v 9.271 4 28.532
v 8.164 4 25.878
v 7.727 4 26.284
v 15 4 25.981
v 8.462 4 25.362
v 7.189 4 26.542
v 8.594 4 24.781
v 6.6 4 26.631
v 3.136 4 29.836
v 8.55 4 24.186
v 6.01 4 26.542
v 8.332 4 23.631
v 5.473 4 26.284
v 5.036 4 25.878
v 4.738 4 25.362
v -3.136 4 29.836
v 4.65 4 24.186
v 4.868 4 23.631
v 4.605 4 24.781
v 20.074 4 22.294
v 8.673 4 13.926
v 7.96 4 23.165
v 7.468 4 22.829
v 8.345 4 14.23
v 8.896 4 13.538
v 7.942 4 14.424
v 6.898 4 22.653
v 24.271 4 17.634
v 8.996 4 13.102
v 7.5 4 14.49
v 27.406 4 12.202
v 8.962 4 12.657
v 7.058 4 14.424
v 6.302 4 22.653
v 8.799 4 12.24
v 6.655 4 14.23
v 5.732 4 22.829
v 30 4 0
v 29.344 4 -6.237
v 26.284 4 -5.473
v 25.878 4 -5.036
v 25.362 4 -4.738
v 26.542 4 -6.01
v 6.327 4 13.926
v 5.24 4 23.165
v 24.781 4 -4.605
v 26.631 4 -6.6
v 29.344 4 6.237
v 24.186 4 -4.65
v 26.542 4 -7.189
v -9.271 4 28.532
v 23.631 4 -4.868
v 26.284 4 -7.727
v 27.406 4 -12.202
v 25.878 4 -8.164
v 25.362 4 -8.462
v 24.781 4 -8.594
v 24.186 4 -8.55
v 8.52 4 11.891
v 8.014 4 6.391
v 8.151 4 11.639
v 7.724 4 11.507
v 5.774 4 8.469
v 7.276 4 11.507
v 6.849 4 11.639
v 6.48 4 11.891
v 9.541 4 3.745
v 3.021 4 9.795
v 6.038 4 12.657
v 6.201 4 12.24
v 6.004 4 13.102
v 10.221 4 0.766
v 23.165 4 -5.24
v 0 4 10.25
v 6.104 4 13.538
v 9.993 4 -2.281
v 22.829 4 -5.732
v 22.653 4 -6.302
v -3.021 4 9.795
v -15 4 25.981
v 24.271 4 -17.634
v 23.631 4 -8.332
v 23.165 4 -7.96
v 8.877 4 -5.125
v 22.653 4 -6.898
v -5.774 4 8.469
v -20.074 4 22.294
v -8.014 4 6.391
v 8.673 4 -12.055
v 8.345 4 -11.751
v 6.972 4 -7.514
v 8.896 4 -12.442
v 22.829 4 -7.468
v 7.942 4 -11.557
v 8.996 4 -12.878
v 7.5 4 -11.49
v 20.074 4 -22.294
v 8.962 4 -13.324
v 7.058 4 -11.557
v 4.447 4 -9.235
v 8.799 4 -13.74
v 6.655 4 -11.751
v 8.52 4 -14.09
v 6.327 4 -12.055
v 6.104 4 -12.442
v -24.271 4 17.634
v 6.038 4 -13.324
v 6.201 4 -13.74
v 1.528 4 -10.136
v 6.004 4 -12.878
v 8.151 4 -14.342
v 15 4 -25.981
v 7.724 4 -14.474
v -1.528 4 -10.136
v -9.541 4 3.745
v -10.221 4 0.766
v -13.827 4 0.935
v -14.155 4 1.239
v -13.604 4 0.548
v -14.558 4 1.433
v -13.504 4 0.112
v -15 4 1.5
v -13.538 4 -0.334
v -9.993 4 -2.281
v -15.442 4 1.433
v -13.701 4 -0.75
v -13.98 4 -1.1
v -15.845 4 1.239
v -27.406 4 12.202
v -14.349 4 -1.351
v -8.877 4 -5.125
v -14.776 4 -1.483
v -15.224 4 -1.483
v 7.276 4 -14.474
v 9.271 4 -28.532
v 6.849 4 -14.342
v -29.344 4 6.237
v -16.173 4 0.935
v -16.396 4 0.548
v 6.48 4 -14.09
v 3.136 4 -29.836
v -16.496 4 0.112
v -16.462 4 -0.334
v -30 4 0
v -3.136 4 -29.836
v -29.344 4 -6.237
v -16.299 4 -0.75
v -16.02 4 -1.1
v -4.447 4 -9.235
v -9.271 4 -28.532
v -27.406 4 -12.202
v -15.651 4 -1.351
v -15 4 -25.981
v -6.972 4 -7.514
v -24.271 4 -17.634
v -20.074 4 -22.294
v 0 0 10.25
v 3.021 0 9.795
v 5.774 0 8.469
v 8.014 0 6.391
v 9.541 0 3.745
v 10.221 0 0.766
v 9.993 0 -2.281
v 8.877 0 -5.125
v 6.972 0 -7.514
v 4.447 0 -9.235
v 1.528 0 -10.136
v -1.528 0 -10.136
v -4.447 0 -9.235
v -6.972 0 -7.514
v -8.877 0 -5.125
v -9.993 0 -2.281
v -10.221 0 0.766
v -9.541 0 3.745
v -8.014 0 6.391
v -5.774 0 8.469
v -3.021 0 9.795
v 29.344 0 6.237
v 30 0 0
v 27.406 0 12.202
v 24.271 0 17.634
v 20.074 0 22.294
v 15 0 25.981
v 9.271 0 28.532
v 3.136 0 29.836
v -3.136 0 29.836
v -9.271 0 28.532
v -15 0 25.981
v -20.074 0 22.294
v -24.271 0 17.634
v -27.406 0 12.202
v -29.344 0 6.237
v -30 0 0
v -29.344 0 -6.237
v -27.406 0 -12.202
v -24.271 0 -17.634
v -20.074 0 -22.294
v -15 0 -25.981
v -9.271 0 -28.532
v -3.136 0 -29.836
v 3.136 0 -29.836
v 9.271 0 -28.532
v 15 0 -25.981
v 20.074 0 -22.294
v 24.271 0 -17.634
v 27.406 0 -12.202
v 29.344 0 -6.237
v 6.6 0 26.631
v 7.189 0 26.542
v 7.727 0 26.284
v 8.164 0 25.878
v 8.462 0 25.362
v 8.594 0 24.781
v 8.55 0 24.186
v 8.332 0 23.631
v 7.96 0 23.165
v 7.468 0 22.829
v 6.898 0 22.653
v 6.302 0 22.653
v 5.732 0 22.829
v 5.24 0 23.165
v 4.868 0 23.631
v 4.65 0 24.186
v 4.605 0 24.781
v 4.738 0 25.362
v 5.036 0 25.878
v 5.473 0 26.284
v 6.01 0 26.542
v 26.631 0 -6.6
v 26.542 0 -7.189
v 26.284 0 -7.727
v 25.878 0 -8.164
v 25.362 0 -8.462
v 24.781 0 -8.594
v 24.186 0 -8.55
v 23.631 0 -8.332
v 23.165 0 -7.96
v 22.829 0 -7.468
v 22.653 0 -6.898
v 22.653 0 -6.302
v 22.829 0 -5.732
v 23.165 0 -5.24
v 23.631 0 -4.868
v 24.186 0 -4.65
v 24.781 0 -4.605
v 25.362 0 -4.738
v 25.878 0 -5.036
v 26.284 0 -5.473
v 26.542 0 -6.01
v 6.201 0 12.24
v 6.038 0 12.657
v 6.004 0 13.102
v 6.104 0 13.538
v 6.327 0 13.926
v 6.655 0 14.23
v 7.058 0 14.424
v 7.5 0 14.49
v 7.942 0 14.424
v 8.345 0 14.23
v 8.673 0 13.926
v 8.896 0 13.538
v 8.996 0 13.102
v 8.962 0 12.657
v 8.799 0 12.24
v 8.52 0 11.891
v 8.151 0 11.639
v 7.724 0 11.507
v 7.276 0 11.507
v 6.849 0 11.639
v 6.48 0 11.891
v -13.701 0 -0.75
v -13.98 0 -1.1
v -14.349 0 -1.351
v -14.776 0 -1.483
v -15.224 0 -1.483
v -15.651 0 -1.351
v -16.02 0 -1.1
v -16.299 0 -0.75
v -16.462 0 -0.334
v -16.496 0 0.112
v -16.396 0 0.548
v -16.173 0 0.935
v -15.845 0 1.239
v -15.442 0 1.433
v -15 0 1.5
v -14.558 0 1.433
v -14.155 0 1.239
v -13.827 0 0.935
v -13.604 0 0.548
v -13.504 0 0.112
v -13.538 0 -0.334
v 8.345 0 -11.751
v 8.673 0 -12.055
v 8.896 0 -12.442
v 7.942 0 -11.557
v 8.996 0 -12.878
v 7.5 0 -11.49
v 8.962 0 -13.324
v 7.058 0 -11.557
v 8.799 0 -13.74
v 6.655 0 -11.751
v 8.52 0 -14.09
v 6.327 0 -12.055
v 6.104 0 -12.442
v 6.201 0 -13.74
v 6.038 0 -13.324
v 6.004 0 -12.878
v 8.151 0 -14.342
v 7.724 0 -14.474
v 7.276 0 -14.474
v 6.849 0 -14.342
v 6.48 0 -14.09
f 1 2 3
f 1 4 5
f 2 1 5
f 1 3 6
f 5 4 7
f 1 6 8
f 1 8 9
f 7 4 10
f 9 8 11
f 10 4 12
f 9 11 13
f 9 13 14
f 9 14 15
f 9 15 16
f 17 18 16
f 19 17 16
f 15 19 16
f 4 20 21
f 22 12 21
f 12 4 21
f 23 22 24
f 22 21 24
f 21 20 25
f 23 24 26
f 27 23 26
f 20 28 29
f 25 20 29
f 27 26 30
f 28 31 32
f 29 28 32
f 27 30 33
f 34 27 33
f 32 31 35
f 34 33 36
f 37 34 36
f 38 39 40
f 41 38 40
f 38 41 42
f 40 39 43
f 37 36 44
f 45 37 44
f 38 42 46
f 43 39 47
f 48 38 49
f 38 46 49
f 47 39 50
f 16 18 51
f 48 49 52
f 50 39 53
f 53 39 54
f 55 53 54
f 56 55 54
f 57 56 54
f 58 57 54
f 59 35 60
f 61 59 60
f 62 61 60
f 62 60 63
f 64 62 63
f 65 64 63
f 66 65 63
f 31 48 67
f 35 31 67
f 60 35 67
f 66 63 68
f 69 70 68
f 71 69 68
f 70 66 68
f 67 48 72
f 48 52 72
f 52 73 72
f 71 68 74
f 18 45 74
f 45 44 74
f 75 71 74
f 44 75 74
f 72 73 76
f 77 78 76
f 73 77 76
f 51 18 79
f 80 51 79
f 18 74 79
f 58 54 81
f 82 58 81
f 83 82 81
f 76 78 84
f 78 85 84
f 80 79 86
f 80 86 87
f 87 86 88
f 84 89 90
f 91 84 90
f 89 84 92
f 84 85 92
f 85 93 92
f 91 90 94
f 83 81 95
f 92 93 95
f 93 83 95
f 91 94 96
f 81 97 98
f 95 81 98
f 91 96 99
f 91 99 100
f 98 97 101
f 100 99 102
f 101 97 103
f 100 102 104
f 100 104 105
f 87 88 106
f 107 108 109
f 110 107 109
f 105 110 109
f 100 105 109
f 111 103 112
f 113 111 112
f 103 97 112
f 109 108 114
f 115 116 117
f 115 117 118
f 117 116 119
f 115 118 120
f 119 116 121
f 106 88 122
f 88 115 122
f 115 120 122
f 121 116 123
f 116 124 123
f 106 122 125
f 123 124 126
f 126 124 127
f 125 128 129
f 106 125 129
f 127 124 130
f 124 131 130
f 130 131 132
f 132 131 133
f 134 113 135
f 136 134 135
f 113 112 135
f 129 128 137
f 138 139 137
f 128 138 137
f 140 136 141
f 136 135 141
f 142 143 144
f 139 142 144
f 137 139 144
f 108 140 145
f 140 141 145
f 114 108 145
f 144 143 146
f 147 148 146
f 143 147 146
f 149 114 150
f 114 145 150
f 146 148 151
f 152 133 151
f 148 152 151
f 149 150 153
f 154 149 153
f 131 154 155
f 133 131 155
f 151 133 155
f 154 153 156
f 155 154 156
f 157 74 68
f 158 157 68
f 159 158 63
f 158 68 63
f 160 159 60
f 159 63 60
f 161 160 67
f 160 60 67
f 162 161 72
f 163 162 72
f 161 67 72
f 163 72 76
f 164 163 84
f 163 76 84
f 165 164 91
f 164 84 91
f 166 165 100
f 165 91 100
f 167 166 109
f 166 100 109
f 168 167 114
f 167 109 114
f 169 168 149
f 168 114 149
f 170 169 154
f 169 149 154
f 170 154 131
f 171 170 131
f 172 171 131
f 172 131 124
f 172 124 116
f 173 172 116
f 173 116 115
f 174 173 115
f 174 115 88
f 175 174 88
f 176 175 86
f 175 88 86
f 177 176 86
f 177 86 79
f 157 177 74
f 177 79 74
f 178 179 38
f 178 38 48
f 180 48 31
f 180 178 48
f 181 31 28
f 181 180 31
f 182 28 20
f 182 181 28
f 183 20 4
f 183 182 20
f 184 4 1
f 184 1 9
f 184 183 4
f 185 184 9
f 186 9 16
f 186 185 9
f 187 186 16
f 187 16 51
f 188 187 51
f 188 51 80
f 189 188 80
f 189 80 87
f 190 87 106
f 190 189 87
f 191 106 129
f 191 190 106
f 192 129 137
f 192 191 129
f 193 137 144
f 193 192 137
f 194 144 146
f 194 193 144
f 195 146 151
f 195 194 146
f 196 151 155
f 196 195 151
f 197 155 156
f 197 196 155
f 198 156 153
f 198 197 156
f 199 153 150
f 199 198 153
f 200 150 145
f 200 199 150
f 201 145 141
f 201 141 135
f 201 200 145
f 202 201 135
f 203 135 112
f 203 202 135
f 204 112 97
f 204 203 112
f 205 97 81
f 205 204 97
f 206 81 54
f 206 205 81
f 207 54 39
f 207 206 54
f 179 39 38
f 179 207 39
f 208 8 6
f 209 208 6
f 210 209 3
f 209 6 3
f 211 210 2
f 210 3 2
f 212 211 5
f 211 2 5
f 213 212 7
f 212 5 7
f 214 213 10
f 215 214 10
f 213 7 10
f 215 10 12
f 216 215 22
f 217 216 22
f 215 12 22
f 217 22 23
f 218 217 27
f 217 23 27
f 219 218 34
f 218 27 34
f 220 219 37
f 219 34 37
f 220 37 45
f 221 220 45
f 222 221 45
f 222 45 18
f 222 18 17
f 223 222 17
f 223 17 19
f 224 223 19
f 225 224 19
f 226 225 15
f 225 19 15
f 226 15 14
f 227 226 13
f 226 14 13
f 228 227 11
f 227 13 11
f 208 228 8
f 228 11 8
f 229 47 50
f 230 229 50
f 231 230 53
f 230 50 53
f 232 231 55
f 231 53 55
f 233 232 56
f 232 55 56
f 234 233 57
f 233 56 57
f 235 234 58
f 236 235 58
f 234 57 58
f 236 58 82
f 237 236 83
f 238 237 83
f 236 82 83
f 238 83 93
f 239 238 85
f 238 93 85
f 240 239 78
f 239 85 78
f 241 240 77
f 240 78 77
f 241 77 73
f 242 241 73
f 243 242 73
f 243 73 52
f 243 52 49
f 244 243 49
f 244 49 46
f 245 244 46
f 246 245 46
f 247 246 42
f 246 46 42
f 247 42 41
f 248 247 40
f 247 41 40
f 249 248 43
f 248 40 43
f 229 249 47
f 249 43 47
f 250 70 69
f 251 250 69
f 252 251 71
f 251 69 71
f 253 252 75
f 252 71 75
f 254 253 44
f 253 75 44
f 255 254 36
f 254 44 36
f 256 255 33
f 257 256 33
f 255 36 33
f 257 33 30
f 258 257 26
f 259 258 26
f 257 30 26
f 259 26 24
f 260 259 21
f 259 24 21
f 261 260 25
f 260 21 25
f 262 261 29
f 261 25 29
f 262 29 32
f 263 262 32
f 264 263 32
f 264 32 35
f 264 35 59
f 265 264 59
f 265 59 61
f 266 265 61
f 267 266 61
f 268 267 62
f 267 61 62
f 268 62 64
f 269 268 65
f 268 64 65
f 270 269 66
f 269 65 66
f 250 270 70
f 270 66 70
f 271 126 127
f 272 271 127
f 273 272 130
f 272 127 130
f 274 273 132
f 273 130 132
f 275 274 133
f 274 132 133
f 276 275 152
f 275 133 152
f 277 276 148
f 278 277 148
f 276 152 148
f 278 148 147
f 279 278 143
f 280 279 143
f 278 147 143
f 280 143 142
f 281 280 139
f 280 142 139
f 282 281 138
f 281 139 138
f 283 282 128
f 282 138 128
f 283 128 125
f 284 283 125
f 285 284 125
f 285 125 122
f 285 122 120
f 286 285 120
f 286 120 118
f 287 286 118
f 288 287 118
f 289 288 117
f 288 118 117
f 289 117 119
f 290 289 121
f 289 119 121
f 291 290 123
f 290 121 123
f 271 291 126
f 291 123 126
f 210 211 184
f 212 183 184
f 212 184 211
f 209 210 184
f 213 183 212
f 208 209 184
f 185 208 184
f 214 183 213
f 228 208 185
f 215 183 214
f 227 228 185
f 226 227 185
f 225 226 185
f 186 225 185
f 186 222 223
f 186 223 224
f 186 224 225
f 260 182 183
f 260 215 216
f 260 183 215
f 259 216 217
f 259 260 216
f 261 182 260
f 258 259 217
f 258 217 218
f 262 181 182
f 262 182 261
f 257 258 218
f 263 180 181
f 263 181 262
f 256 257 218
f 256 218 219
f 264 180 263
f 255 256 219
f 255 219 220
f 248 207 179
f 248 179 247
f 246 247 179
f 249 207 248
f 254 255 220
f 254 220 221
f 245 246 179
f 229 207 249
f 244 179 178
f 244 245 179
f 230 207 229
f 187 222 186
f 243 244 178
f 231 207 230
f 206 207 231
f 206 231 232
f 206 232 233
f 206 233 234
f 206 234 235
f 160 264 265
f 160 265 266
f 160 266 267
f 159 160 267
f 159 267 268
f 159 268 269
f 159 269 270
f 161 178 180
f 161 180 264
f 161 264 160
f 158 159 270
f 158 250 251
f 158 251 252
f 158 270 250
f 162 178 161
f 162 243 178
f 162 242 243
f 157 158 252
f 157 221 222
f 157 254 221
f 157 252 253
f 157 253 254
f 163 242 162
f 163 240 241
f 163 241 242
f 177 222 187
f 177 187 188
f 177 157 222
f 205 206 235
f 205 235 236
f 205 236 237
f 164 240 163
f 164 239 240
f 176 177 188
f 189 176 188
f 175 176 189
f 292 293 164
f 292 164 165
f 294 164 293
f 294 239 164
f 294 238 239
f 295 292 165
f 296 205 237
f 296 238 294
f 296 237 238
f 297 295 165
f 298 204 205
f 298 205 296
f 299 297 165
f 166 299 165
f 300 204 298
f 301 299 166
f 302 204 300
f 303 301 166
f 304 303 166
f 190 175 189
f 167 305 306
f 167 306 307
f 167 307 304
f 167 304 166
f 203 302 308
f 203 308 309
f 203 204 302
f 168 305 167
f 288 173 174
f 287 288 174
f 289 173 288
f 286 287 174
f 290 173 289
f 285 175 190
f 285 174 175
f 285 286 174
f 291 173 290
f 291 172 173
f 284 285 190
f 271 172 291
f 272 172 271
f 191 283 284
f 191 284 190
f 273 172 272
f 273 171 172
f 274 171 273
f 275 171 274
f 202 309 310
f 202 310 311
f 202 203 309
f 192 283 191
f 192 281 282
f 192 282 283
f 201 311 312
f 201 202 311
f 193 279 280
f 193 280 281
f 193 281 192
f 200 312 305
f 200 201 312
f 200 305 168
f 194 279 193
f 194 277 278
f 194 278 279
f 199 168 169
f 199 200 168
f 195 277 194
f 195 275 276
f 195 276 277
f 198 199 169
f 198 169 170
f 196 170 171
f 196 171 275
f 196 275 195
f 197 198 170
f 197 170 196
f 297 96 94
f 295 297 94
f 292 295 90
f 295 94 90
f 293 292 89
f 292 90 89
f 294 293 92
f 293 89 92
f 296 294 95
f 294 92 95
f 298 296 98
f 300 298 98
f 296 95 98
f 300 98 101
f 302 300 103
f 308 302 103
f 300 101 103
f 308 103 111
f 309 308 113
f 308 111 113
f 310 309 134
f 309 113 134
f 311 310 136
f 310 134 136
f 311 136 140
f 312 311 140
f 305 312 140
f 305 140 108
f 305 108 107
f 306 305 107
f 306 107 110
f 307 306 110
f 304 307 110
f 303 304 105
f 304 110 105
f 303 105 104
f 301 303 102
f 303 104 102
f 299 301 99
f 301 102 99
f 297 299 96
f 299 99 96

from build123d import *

# Parameters (mm, degrees)
BOSS_EXTRUDE1_DEPTH = 4
SKETCH2_R           = 1.5
CUT_EXTRUDE1_DEPTH  = 4
CIRPATTERN1_COUNT   = 3
SKETCH3_R           = 10.25
CUT_EXTRUDE2_DEPTH  = 4
SKETCH4_R           = 2
CUT_EXTRUDE3_DEPTH  = 4
CIRPATTERN2_COUNT   = 2
CIRPATTERN2_ANGLE   = 90


with BuildPart() as part:
    # Sketch1 → Boss-Extrude1 (new body)
    with BuildSketch(Plane(origin=(0, 0, 0), x_dir=(1, 0, 0), z_dir=(0, 1, 0))):
        with BuildLine():
            ThreePointArc((-30, 0), (0, 30), (30, 0))
            ThreePointArc((30, 0), (0, -30), (-30, 0))
        make_face()
    extrude(amount=BOSS_EXTRUDE1_DEPTH)

    # Sketch2 → Cut-Extrude1 (cut)
    with BuildSketch(Plane(origin=(0, 4, 0), x_dir=(1, 0, 0), z_dir=(0, 1, 0))):
        with Locations(Location((7.5, 12.990381057, 0), (0, 0, 270))):
            Circle(SKETCH2_R)
    cut_extrude1 = extrude(amount=-CUT_EXTRUDE1_DEPTH, mode=Mode.SUBTRACT)

    # CirPattern1: Cut-Extrude1 ×3 about axis
    cirpattern1_axis = Axis((0, 0, 0), (0, 1, 0))
    for i in range(1, CIRPATTERN1_COUNT):
        add(cut_extrude1.rotate(cirpattern1_axis, i * 360 / CIRPATTERN1_COUNT), mode=Mode.SUBTRACT)

    # Sketch3 → Cut-Extrude2 (cut)
    with BuildSketch(Plane(origin=(0, 4, 0), x_dir=(1, 0, 0), z_dir=(0, 1, 0))):
        with Locations(Location((0, 0, 0), (0, 0, 270))):
            Circle(SKETCH3_R)
    extrude(amount=-CUT_EXTRUDE2_DEPTH, mode=Mode.SUBTRACT)

    # Sketch4 → Cut-Extrude3 (cut)
    with BuildSketch(Plane(origin=(0, 4, 0), x_dir=(1, 0, 0), z_dir=(0, 1, 0))):
        with Locations(Location((6.59989, -24.631107405, 0), (0, 0, 270))):
            Circle(SKETCH4_R)
    cut_extrude3 = extrude(amount=-CUT_EXTRUDE3_DEPTH, mode=Mode.SUBTRACT)

    # CirPattern2: Cut-Extrude3 ×2 about axis
    cirpattern2_axis = Axis((0, 4, 0), (0, 1, 0))
    for i in range(1, CIRPATTERN2_COUNT):
        add(cut_extrude3.rotate(cirpattern2_axis, i * CIRPATTERN2_ANGLE / (CIRPATTERN2_COUNT - 1)), mode=Mode.SUBTRACT)


solid = part.part
